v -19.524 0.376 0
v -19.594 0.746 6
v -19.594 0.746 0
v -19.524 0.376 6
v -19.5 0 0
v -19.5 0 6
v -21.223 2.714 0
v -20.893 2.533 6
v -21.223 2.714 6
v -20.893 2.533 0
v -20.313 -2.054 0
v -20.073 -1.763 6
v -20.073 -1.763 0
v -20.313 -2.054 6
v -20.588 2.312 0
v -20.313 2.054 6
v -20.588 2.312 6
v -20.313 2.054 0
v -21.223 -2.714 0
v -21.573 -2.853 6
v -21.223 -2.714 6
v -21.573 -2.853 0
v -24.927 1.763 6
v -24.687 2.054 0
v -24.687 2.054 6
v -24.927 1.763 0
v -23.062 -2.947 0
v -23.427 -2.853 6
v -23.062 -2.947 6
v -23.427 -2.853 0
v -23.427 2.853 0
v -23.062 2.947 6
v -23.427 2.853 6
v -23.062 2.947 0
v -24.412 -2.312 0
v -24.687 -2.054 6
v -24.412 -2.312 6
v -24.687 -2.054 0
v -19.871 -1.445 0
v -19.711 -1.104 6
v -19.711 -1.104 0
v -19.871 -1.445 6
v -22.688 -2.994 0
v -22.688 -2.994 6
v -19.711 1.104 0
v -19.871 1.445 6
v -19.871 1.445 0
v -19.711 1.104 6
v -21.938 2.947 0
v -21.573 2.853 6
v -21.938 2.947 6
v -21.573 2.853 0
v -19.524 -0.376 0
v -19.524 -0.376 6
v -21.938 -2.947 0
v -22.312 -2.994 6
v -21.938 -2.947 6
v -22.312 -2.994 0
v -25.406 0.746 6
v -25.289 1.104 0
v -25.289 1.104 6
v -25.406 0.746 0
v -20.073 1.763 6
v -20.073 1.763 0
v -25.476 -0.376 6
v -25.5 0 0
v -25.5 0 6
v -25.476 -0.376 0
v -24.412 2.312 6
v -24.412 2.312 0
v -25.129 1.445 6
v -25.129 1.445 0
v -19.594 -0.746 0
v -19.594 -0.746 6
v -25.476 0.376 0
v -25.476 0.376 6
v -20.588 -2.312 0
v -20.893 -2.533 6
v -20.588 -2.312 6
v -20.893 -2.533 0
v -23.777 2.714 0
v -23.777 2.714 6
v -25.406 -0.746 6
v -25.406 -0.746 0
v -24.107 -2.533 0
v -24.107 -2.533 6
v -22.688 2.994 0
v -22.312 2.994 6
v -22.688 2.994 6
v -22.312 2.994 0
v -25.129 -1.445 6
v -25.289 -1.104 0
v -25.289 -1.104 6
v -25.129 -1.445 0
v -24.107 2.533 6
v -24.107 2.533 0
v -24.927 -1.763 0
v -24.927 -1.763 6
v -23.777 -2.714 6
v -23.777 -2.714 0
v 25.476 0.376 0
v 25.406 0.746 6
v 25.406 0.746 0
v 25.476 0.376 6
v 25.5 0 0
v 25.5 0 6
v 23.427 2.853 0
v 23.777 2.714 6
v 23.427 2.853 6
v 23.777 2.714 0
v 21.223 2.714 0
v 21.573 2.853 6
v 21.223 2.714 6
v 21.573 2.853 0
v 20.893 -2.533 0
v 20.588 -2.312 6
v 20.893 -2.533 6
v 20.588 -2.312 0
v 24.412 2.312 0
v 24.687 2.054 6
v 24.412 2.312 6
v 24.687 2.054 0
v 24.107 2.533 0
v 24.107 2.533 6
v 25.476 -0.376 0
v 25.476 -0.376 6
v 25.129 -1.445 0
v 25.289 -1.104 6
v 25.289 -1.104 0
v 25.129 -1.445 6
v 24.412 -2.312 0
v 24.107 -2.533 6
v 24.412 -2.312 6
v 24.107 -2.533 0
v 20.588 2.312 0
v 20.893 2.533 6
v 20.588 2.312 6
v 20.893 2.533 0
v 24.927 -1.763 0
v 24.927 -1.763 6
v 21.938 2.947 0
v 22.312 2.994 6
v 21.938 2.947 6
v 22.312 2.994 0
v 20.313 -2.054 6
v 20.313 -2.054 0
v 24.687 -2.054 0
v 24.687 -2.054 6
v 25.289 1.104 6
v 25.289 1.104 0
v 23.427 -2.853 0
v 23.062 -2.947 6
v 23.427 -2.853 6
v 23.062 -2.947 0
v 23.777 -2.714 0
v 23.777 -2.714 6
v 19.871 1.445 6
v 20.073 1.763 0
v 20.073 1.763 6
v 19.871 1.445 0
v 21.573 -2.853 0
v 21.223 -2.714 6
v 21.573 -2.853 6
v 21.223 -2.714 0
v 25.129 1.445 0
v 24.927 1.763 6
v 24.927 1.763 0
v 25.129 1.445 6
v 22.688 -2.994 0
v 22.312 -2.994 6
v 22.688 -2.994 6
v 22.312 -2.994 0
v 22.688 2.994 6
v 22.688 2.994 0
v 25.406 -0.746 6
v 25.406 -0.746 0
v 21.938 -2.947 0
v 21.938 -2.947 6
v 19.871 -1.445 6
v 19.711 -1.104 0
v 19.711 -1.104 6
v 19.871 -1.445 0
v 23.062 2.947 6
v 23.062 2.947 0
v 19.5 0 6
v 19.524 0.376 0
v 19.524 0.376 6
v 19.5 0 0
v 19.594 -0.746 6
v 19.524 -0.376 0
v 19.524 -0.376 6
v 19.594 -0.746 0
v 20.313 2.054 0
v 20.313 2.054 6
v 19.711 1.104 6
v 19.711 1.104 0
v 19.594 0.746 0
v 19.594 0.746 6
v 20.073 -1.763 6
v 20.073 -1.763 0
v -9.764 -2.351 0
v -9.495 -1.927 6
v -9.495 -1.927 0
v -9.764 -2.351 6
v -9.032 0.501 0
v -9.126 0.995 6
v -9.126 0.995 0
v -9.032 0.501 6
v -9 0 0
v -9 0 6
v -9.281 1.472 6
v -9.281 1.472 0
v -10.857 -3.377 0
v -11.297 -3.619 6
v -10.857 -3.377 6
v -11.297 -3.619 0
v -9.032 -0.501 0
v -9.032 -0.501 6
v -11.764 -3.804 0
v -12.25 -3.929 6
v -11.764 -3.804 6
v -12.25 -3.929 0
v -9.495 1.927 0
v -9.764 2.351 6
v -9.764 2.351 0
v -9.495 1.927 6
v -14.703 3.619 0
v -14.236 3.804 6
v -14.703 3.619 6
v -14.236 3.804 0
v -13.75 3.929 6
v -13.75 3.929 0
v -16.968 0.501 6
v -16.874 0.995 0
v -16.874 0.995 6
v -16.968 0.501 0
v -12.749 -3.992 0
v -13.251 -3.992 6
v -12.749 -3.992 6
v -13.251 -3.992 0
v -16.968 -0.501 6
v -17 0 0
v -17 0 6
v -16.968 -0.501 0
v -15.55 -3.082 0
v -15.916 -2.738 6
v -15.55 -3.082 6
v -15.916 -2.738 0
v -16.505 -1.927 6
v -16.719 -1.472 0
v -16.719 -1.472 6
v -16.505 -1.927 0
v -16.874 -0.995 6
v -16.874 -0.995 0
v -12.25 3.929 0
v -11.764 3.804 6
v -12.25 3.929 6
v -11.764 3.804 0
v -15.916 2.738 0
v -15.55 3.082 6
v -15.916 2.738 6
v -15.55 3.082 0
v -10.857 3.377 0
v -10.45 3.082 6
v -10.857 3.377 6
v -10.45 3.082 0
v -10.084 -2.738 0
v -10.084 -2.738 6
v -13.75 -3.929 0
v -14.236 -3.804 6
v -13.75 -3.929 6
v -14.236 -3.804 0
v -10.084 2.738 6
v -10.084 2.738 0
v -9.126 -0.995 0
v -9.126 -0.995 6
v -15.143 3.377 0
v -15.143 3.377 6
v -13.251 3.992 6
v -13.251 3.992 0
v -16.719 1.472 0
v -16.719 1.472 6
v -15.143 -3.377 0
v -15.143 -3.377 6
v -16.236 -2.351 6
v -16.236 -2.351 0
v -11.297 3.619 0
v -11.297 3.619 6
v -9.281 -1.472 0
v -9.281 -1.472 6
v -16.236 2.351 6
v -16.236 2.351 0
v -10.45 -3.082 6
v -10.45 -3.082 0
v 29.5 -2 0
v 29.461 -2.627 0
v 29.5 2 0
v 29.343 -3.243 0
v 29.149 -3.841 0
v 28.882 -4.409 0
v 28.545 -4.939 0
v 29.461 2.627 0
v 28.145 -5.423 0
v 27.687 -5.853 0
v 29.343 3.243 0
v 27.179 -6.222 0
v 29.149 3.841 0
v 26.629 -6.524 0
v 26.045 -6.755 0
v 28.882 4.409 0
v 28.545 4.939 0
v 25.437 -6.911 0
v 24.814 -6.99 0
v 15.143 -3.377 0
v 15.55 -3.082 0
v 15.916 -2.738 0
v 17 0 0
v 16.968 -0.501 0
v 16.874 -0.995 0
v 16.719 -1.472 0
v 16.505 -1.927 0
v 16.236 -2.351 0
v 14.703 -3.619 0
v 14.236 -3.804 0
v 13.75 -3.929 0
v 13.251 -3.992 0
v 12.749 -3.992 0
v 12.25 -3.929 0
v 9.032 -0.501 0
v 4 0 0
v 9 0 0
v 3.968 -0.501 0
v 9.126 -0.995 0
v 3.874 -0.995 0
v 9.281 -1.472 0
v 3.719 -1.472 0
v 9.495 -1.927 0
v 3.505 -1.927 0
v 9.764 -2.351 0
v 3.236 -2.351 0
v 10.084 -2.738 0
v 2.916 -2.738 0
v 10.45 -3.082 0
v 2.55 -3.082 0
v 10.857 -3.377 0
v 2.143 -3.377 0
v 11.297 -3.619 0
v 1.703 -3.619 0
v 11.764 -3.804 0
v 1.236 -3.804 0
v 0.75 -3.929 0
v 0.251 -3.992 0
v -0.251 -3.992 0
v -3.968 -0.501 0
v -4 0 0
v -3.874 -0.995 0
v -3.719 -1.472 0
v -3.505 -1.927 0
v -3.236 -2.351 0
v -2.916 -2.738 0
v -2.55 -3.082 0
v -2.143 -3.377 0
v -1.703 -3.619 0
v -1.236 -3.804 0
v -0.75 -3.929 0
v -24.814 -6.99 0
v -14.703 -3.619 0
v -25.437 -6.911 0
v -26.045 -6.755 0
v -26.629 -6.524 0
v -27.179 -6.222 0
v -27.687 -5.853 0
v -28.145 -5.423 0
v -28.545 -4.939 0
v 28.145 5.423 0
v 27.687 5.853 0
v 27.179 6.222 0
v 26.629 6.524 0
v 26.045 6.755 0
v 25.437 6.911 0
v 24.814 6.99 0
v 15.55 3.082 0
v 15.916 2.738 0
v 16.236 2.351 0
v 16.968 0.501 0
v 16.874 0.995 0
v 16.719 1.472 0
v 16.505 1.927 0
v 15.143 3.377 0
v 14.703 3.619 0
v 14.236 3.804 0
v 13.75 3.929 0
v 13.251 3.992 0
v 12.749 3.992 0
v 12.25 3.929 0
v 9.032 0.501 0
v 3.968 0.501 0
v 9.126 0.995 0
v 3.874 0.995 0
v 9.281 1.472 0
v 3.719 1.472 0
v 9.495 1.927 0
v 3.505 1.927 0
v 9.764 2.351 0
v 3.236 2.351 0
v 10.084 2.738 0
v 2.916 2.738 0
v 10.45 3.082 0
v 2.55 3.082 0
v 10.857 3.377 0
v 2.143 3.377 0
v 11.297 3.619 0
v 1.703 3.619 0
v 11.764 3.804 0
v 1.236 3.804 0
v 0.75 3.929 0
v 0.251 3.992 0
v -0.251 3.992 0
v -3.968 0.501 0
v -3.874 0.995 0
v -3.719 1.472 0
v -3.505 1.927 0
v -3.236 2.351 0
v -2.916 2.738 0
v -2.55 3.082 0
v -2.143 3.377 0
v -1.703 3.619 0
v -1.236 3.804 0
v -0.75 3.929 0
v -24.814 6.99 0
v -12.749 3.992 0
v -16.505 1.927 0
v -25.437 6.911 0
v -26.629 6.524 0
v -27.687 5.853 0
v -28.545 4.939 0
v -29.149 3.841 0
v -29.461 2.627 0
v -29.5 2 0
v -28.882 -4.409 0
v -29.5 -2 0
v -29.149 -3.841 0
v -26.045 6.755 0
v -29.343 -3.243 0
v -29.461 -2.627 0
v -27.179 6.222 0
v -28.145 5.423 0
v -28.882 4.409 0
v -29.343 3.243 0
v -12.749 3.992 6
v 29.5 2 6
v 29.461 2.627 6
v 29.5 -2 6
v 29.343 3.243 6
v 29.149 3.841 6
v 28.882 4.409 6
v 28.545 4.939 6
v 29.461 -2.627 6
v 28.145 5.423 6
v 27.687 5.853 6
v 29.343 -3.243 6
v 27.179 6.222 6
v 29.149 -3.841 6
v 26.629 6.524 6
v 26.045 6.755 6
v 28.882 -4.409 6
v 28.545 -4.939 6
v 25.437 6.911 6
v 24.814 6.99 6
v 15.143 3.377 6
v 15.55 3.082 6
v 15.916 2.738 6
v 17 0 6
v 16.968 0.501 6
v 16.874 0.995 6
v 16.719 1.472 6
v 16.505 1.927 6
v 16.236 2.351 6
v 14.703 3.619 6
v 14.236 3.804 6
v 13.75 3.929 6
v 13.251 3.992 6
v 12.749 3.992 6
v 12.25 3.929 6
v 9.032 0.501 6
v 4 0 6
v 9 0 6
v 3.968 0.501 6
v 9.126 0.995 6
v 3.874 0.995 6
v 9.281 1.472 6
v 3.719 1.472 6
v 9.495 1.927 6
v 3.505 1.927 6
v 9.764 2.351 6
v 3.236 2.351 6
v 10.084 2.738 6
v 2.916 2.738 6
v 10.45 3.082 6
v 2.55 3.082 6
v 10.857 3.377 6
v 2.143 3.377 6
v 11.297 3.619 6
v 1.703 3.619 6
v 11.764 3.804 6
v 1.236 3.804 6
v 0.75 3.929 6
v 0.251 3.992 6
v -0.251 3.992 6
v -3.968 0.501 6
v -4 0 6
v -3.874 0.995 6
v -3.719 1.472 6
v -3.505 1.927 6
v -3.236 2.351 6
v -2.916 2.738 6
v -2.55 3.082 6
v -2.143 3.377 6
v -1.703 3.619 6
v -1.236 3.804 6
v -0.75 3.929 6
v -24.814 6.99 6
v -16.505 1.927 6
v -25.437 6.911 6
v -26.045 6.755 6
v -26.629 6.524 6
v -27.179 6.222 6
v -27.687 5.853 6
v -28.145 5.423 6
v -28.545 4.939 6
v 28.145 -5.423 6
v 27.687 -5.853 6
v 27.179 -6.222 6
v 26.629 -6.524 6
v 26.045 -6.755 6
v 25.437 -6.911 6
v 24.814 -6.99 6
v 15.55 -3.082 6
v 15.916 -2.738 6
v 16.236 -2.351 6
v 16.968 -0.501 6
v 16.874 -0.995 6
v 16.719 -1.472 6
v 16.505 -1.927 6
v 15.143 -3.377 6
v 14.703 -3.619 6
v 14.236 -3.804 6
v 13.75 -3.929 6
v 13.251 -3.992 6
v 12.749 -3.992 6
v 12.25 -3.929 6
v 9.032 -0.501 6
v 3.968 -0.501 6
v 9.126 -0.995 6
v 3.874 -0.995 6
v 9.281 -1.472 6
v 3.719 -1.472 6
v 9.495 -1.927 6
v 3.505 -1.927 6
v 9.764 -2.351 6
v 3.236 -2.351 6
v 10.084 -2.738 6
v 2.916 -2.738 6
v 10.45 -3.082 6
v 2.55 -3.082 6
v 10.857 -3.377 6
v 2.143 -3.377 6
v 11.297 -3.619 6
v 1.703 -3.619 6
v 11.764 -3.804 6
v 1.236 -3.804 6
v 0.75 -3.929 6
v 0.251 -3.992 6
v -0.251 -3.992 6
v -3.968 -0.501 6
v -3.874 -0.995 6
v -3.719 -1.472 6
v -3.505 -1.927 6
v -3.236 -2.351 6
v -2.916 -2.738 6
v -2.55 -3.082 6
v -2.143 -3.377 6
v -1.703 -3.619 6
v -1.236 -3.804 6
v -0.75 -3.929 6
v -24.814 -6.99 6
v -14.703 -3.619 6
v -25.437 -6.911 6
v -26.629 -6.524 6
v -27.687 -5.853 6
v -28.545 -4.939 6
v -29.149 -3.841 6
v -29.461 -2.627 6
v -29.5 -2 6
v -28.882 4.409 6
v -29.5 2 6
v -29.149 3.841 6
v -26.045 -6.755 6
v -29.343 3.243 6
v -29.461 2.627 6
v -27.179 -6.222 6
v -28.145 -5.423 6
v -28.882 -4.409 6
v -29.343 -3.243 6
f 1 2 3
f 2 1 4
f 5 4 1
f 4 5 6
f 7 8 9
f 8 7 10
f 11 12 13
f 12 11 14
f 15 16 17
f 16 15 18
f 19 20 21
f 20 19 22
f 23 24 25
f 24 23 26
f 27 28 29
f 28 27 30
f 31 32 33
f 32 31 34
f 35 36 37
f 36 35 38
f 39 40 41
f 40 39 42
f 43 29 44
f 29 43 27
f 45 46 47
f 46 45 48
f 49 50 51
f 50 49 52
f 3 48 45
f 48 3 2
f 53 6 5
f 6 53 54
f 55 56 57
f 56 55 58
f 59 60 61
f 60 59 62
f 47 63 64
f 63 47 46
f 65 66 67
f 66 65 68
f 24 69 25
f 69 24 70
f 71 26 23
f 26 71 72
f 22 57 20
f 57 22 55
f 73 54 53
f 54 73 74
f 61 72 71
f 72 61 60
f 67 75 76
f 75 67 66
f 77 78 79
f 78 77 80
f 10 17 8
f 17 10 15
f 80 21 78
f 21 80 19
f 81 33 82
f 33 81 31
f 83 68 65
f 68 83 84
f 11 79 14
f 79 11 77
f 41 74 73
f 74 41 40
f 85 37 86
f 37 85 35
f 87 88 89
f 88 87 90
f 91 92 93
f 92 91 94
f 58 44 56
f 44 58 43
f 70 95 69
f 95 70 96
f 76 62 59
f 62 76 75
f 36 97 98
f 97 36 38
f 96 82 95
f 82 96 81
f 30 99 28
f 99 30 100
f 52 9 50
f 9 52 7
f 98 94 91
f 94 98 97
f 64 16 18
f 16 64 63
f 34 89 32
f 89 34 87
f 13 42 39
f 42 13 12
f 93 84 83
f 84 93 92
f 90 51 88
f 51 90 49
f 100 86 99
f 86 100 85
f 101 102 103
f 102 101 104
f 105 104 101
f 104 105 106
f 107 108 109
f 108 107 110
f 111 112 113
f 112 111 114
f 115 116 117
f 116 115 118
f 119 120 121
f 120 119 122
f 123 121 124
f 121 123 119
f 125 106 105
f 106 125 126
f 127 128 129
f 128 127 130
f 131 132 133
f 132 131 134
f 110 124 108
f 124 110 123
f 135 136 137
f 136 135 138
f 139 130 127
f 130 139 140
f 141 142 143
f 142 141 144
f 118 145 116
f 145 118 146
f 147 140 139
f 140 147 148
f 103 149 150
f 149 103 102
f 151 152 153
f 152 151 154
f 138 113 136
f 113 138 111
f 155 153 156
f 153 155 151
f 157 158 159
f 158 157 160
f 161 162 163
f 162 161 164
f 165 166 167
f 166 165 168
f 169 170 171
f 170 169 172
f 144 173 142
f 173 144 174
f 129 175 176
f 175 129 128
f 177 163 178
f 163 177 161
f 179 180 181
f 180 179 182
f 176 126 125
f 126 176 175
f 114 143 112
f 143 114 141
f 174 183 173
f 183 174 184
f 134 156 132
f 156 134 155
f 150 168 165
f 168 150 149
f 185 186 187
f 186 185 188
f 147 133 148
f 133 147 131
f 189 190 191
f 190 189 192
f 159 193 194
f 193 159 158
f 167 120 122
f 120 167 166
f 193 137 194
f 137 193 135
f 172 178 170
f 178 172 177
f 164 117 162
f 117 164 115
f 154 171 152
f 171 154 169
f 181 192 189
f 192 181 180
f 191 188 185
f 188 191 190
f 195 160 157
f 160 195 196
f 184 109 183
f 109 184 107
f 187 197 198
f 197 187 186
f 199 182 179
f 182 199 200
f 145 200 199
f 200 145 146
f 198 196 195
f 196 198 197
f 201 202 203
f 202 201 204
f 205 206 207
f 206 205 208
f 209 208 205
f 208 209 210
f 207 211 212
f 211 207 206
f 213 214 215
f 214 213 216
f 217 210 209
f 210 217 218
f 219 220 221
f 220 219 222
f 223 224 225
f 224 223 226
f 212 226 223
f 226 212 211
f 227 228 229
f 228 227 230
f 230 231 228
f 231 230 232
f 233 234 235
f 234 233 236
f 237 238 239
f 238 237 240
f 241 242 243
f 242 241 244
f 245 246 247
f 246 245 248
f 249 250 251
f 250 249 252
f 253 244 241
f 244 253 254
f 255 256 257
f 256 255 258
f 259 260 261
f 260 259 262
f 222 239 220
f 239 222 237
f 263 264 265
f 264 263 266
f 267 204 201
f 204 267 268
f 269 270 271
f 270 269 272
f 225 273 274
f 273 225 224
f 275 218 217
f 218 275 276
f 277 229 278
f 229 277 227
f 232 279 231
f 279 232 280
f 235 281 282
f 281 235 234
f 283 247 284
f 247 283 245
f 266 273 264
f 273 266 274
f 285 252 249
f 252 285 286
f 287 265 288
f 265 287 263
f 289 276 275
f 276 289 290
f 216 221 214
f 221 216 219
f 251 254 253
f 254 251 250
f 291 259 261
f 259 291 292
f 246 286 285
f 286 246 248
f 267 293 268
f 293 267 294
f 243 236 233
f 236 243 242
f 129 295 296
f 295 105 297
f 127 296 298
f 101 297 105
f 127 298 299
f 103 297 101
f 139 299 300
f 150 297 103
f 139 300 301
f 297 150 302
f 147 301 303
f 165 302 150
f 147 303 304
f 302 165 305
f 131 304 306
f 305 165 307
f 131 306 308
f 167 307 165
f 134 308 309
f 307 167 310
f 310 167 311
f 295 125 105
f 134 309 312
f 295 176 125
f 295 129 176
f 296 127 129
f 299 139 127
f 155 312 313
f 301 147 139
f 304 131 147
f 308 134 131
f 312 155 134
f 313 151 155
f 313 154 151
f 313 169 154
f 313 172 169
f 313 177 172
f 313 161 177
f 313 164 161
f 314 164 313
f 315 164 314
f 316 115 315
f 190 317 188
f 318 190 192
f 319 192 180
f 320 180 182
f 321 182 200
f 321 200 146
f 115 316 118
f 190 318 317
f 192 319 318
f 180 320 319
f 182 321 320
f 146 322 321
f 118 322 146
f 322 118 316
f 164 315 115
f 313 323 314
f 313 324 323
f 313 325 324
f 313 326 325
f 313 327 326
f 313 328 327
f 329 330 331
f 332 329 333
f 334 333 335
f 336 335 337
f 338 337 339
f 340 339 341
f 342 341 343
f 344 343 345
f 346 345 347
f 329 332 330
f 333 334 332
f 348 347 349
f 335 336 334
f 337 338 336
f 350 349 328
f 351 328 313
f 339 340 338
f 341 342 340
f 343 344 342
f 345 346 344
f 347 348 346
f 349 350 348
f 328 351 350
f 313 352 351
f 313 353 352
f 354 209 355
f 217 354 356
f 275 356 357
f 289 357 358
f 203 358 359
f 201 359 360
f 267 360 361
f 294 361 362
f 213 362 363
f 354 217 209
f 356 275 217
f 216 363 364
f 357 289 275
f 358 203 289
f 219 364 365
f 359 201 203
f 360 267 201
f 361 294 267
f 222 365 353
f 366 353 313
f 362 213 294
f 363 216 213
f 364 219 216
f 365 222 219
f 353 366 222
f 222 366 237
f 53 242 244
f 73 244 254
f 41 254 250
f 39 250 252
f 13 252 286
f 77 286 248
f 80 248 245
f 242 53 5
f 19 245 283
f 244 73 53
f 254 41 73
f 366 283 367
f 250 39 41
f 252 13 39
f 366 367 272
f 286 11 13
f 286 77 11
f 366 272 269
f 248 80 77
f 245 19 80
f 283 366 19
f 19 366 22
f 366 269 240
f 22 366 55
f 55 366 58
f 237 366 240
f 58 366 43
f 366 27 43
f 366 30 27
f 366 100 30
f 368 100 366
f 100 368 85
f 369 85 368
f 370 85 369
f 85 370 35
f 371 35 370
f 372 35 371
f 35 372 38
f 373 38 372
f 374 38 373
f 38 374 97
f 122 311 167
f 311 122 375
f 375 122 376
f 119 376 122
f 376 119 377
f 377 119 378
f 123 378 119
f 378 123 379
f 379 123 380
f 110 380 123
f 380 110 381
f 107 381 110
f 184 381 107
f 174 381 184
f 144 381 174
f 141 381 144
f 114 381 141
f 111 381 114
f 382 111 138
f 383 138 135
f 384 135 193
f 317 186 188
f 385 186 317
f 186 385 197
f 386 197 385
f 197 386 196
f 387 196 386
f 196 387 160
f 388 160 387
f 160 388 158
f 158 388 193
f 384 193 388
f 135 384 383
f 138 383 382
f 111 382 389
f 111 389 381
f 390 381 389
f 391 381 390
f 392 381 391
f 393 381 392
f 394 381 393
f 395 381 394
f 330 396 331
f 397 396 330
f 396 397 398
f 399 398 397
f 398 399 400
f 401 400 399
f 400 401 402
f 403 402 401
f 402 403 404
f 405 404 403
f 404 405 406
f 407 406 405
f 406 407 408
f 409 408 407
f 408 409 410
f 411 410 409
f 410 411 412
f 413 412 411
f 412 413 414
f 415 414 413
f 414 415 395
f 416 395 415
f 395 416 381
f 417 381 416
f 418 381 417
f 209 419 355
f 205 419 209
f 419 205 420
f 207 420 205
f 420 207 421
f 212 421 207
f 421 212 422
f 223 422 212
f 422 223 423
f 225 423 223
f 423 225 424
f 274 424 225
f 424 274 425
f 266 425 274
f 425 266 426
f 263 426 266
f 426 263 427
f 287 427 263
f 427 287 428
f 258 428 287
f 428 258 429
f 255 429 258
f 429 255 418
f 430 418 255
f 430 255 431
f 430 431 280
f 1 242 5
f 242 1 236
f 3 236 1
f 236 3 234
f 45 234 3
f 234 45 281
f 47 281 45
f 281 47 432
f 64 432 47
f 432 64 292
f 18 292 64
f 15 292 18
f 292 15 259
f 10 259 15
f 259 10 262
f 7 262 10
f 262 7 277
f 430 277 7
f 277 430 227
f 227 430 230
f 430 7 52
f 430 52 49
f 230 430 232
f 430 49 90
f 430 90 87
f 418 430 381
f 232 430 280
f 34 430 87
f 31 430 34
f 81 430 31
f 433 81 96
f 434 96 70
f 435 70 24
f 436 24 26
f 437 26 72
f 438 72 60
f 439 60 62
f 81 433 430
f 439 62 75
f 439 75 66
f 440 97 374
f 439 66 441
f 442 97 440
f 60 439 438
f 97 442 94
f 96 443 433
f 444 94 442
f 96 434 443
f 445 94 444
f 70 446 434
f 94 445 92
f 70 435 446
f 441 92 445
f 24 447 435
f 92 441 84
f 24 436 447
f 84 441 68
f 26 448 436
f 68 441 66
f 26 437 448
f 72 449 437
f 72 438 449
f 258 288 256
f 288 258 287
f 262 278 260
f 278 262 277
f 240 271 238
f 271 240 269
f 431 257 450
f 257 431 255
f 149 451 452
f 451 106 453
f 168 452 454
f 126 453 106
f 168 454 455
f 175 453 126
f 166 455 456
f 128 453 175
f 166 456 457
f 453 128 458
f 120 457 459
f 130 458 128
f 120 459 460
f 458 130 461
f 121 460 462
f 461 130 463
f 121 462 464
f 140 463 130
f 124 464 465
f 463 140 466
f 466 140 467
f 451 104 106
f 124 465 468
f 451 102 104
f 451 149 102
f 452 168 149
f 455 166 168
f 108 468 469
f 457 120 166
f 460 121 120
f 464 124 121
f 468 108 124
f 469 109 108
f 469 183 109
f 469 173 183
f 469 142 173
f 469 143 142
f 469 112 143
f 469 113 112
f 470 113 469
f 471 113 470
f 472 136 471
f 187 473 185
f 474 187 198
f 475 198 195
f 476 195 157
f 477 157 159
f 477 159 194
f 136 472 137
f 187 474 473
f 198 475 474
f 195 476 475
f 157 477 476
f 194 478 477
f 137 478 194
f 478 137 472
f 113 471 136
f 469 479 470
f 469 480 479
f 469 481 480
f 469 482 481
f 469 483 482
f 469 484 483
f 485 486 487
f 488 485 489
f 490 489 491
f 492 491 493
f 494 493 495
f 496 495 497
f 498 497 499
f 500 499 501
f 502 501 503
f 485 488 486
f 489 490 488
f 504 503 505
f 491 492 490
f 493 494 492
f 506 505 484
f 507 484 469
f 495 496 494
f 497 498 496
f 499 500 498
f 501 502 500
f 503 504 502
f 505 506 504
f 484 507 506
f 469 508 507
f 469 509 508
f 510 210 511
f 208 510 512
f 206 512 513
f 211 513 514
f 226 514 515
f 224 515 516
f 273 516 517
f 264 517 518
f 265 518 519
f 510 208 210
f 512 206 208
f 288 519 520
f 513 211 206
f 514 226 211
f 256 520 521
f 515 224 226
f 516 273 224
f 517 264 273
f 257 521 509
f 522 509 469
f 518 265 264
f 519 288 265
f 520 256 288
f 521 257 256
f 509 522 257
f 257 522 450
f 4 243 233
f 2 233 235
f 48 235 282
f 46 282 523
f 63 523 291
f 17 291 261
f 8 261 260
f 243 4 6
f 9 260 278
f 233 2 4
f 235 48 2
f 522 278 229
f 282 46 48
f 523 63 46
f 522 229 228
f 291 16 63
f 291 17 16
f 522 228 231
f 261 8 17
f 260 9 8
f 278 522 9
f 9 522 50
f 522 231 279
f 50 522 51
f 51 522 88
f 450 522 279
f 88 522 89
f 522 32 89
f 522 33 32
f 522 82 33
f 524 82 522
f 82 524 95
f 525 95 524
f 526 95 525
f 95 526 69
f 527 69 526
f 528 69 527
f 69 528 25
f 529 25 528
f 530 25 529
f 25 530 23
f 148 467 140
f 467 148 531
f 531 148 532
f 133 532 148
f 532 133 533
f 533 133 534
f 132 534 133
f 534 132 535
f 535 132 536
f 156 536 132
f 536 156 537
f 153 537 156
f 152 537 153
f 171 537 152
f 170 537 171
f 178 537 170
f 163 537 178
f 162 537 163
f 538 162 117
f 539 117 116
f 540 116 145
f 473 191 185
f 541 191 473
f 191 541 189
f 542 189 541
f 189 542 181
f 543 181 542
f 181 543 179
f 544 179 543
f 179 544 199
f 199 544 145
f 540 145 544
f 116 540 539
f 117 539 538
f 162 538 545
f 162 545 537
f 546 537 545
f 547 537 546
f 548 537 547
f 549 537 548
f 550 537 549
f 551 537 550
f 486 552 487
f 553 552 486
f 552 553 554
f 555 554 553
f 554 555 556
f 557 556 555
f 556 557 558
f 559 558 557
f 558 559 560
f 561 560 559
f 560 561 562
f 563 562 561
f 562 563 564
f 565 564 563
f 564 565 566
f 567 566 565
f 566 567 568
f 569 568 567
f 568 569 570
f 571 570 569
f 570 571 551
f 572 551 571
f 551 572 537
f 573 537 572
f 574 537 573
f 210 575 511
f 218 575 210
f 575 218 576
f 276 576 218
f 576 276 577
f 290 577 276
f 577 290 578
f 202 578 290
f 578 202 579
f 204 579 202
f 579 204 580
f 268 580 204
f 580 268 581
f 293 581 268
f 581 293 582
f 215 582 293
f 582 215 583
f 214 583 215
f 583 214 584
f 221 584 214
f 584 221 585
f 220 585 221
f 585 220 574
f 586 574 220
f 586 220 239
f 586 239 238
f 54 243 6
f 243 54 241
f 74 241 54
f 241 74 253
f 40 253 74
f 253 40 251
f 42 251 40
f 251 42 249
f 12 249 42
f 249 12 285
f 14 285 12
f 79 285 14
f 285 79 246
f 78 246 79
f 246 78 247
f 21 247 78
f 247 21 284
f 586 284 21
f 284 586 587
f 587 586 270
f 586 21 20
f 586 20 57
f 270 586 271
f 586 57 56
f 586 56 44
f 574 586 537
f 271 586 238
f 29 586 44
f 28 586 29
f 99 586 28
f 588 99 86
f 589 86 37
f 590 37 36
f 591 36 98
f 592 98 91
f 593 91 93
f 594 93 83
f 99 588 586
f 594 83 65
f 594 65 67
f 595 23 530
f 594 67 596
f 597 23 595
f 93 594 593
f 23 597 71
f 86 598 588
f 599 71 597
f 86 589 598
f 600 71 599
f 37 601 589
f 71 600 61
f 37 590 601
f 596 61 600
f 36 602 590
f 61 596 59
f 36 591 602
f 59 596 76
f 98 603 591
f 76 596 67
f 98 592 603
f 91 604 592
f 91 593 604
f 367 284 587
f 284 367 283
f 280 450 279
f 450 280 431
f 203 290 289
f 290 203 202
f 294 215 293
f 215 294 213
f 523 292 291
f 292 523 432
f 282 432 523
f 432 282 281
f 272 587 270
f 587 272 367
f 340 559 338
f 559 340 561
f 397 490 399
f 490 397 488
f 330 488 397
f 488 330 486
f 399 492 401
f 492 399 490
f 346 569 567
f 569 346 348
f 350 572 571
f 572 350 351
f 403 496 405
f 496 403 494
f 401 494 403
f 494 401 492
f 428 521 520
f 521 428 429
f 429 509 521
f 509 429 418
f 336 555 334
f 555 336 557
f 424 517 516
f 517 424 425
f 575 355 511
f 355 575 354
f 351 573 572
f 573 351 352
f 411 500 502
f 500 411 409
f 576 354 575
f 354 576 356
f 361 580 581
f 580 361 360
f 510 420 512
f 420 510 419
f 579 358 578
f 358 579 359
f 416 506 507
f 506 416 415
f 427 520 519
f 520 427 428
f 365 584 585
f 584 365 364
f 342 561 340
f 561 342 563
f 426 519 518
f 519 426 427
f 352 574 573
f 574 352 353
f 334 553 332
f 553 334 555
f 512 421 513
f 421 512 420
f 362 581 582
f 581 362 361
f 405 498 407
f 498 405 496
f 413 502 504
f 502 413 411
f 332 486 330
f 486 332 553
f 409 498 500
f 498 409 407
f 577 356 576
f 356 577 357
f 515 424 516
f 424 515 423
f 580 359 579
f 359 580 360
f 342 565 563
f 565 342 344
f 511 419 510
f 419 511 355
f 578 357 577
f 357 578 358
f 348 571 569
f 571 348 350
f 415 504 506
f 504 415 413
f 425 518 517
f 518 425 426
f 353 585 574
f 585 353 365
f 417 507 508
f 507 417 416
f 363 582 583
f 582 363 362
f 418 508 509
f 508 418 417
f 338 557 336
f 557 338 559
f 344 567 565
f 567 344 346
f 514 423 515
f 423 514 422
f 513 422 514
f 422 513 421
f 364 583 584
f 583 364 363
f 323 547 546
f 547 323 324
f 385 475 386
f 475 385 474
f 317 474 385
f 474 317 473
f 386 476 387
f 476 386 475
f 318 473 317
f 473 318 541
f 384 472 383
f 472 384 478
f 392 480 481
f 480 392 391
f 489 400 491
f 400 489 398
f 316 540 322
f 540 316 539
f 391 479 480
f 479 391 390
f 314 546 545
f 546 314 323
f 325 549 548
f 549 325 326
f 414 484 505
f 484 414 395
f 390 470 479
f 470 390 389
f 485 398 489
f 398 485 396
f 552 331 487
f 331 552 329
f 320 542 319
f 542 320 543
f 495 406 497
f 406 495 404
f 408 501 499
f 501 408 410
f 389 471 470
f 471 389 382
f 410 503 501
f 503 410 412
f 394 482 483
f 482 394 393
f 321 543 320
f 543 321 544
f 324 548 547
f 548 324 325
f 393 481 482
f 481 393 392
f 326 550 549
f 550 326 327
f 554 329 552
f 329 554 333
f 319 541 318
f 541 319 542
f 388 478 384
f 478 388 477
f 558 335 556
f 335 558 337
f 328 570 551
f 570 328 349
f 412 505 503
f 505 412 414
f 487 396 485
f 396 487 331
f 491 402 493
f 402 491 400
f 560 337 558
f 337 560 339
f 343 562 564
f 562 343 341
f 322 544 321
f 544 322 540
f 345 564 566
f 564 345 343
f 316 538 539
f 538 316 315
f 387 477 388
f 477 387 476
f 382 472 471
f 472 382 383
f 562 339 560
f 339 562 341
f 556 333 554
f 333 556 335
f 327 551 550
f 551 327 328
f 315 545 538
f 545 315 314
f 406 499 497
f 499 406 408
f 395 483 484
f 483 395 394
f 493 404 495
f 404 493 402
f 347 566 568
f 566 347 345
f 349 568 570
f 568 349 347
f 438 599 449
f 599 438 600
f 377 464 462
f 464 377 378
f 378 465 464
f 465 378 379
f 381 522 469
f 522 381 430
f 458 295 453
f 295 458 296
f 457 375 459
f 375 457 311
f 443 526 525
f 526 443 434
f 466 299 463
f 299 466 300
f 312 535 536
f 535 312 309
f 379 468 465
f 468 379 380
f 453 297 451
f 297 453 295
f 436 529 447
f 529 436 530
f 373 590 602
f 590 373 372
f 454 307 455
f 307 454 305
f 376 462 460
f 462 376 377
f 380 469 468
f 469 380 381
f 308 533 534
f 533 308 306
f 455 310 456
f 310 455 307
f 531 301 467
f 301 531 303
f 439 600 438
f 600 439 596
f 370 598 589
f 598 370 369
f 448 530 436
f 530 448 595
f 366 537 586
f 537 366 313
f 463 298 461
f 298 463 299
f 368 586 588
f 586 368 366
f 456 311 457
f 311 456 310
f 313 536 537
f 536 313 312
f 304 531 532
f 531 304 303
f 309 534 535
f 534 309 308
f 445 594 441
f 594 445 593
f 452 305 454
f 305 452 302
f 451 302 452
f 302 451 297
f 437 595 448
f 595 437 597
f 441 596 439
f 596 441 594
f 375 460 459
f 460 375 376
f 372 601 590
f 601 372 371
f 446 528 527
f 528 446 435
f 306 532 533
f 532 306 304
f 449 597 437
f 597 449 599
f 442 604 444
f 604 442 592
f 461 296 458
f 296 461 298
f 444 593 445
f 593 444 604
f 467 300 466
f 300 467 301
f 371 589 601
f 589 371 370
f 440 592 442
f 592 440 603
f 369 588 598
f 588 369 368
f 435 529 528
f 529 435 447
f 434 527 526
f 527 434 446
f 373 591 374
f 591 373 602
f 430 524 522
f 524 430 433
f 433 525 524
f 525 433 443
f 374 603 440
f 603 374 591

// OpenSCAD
$fn = 50;


difference() {
	union() {
		hull() {
			translate(v = [-24.5000000000, 2.0000000000, 0]) {
				cylinder(h = 6, r = 5);
			}
			translate(v = [24.5000000000, 2.0000000000, 0]) {
				cylinder(h = 6, r = 5);
			}
			translate(v = [-24.5000000000, -2.0000000000, 0]) {
				cylinder(h = 6, r = 5);
			}
			translate(v = [24.5000000000, -2.0000000000, 0]) {
				cylinder(h = 6, r = 5);
			}
		}
	}
	union() {
		#translate(v = [-22.5000000000, 0.0000000000, 0]) {
			cylinder(h = 6, r = 3.0000000000);
		}
		#translate(v = [22.5000000000, 0.0000000000, 0]) {
			cylinder(h = 6, r = 3.0000000000);
		}
		#translate(v = [-22.5000000000, 0.0000000000, -100.0000000000]) {
			cylinder(h = 200, r = 3.0000000000);
		}
		#translate(v = [-22.5000000000, 0.0000000000, -100.0000000000]) {
			cylinder(h = 200, r = 3.0000000000);
		}
		#translate(v = [22.5000000000, 0.0000000000, -100.0000000000]) {
			cylinder(h = 200, r = 3.0000000000);
		}
		#translate(v = [22.5000000000, 0.0000000000, -100.0000000000]) {
			cylinder(h = 200, r = 3.0000000000);
		}
		#translate(v = [-22.5000000000, 0.0000000000, 0]) {
			cylinder(h = 6, r = 1.5000000000);
		}
		#translate(v = [22.5000000000, 0.0000000000, 0]) {
			cylinder(h = 6, r = 1.5000000000);
		}
		#translate(v = [-22.5000000000, 0.0000000000, 0]) {
			cylinder(h = 6, r = 1.5000000000);
		}
		#translate(v = [22.5000000000, 0.0000000000, 0]) {
			cylinder(h = 6, r = 1.5000000000);
		}
		#translate(v = [-22.5000000000, 0.0000000000, 0]) {
			cylinder(h = 6, r = 1.5000000000);
		}
		#translate(v = [22.5000000000, 0.0000000000, 0]) {
			cylinder(h = 6, r = 1.5000000000);
		}
		#translate(v = [-13.0000000000, 0, 0]) {
			cylinder(h = 6, r = 4.0000000000);
		}
		#cylinder(h = 6, r = 4.0000000000);
		#translate(v = [13.0000000000, 0, 0]) {
			cylinder(h = 6, r = 4.0000000000);
		}
	}
}
